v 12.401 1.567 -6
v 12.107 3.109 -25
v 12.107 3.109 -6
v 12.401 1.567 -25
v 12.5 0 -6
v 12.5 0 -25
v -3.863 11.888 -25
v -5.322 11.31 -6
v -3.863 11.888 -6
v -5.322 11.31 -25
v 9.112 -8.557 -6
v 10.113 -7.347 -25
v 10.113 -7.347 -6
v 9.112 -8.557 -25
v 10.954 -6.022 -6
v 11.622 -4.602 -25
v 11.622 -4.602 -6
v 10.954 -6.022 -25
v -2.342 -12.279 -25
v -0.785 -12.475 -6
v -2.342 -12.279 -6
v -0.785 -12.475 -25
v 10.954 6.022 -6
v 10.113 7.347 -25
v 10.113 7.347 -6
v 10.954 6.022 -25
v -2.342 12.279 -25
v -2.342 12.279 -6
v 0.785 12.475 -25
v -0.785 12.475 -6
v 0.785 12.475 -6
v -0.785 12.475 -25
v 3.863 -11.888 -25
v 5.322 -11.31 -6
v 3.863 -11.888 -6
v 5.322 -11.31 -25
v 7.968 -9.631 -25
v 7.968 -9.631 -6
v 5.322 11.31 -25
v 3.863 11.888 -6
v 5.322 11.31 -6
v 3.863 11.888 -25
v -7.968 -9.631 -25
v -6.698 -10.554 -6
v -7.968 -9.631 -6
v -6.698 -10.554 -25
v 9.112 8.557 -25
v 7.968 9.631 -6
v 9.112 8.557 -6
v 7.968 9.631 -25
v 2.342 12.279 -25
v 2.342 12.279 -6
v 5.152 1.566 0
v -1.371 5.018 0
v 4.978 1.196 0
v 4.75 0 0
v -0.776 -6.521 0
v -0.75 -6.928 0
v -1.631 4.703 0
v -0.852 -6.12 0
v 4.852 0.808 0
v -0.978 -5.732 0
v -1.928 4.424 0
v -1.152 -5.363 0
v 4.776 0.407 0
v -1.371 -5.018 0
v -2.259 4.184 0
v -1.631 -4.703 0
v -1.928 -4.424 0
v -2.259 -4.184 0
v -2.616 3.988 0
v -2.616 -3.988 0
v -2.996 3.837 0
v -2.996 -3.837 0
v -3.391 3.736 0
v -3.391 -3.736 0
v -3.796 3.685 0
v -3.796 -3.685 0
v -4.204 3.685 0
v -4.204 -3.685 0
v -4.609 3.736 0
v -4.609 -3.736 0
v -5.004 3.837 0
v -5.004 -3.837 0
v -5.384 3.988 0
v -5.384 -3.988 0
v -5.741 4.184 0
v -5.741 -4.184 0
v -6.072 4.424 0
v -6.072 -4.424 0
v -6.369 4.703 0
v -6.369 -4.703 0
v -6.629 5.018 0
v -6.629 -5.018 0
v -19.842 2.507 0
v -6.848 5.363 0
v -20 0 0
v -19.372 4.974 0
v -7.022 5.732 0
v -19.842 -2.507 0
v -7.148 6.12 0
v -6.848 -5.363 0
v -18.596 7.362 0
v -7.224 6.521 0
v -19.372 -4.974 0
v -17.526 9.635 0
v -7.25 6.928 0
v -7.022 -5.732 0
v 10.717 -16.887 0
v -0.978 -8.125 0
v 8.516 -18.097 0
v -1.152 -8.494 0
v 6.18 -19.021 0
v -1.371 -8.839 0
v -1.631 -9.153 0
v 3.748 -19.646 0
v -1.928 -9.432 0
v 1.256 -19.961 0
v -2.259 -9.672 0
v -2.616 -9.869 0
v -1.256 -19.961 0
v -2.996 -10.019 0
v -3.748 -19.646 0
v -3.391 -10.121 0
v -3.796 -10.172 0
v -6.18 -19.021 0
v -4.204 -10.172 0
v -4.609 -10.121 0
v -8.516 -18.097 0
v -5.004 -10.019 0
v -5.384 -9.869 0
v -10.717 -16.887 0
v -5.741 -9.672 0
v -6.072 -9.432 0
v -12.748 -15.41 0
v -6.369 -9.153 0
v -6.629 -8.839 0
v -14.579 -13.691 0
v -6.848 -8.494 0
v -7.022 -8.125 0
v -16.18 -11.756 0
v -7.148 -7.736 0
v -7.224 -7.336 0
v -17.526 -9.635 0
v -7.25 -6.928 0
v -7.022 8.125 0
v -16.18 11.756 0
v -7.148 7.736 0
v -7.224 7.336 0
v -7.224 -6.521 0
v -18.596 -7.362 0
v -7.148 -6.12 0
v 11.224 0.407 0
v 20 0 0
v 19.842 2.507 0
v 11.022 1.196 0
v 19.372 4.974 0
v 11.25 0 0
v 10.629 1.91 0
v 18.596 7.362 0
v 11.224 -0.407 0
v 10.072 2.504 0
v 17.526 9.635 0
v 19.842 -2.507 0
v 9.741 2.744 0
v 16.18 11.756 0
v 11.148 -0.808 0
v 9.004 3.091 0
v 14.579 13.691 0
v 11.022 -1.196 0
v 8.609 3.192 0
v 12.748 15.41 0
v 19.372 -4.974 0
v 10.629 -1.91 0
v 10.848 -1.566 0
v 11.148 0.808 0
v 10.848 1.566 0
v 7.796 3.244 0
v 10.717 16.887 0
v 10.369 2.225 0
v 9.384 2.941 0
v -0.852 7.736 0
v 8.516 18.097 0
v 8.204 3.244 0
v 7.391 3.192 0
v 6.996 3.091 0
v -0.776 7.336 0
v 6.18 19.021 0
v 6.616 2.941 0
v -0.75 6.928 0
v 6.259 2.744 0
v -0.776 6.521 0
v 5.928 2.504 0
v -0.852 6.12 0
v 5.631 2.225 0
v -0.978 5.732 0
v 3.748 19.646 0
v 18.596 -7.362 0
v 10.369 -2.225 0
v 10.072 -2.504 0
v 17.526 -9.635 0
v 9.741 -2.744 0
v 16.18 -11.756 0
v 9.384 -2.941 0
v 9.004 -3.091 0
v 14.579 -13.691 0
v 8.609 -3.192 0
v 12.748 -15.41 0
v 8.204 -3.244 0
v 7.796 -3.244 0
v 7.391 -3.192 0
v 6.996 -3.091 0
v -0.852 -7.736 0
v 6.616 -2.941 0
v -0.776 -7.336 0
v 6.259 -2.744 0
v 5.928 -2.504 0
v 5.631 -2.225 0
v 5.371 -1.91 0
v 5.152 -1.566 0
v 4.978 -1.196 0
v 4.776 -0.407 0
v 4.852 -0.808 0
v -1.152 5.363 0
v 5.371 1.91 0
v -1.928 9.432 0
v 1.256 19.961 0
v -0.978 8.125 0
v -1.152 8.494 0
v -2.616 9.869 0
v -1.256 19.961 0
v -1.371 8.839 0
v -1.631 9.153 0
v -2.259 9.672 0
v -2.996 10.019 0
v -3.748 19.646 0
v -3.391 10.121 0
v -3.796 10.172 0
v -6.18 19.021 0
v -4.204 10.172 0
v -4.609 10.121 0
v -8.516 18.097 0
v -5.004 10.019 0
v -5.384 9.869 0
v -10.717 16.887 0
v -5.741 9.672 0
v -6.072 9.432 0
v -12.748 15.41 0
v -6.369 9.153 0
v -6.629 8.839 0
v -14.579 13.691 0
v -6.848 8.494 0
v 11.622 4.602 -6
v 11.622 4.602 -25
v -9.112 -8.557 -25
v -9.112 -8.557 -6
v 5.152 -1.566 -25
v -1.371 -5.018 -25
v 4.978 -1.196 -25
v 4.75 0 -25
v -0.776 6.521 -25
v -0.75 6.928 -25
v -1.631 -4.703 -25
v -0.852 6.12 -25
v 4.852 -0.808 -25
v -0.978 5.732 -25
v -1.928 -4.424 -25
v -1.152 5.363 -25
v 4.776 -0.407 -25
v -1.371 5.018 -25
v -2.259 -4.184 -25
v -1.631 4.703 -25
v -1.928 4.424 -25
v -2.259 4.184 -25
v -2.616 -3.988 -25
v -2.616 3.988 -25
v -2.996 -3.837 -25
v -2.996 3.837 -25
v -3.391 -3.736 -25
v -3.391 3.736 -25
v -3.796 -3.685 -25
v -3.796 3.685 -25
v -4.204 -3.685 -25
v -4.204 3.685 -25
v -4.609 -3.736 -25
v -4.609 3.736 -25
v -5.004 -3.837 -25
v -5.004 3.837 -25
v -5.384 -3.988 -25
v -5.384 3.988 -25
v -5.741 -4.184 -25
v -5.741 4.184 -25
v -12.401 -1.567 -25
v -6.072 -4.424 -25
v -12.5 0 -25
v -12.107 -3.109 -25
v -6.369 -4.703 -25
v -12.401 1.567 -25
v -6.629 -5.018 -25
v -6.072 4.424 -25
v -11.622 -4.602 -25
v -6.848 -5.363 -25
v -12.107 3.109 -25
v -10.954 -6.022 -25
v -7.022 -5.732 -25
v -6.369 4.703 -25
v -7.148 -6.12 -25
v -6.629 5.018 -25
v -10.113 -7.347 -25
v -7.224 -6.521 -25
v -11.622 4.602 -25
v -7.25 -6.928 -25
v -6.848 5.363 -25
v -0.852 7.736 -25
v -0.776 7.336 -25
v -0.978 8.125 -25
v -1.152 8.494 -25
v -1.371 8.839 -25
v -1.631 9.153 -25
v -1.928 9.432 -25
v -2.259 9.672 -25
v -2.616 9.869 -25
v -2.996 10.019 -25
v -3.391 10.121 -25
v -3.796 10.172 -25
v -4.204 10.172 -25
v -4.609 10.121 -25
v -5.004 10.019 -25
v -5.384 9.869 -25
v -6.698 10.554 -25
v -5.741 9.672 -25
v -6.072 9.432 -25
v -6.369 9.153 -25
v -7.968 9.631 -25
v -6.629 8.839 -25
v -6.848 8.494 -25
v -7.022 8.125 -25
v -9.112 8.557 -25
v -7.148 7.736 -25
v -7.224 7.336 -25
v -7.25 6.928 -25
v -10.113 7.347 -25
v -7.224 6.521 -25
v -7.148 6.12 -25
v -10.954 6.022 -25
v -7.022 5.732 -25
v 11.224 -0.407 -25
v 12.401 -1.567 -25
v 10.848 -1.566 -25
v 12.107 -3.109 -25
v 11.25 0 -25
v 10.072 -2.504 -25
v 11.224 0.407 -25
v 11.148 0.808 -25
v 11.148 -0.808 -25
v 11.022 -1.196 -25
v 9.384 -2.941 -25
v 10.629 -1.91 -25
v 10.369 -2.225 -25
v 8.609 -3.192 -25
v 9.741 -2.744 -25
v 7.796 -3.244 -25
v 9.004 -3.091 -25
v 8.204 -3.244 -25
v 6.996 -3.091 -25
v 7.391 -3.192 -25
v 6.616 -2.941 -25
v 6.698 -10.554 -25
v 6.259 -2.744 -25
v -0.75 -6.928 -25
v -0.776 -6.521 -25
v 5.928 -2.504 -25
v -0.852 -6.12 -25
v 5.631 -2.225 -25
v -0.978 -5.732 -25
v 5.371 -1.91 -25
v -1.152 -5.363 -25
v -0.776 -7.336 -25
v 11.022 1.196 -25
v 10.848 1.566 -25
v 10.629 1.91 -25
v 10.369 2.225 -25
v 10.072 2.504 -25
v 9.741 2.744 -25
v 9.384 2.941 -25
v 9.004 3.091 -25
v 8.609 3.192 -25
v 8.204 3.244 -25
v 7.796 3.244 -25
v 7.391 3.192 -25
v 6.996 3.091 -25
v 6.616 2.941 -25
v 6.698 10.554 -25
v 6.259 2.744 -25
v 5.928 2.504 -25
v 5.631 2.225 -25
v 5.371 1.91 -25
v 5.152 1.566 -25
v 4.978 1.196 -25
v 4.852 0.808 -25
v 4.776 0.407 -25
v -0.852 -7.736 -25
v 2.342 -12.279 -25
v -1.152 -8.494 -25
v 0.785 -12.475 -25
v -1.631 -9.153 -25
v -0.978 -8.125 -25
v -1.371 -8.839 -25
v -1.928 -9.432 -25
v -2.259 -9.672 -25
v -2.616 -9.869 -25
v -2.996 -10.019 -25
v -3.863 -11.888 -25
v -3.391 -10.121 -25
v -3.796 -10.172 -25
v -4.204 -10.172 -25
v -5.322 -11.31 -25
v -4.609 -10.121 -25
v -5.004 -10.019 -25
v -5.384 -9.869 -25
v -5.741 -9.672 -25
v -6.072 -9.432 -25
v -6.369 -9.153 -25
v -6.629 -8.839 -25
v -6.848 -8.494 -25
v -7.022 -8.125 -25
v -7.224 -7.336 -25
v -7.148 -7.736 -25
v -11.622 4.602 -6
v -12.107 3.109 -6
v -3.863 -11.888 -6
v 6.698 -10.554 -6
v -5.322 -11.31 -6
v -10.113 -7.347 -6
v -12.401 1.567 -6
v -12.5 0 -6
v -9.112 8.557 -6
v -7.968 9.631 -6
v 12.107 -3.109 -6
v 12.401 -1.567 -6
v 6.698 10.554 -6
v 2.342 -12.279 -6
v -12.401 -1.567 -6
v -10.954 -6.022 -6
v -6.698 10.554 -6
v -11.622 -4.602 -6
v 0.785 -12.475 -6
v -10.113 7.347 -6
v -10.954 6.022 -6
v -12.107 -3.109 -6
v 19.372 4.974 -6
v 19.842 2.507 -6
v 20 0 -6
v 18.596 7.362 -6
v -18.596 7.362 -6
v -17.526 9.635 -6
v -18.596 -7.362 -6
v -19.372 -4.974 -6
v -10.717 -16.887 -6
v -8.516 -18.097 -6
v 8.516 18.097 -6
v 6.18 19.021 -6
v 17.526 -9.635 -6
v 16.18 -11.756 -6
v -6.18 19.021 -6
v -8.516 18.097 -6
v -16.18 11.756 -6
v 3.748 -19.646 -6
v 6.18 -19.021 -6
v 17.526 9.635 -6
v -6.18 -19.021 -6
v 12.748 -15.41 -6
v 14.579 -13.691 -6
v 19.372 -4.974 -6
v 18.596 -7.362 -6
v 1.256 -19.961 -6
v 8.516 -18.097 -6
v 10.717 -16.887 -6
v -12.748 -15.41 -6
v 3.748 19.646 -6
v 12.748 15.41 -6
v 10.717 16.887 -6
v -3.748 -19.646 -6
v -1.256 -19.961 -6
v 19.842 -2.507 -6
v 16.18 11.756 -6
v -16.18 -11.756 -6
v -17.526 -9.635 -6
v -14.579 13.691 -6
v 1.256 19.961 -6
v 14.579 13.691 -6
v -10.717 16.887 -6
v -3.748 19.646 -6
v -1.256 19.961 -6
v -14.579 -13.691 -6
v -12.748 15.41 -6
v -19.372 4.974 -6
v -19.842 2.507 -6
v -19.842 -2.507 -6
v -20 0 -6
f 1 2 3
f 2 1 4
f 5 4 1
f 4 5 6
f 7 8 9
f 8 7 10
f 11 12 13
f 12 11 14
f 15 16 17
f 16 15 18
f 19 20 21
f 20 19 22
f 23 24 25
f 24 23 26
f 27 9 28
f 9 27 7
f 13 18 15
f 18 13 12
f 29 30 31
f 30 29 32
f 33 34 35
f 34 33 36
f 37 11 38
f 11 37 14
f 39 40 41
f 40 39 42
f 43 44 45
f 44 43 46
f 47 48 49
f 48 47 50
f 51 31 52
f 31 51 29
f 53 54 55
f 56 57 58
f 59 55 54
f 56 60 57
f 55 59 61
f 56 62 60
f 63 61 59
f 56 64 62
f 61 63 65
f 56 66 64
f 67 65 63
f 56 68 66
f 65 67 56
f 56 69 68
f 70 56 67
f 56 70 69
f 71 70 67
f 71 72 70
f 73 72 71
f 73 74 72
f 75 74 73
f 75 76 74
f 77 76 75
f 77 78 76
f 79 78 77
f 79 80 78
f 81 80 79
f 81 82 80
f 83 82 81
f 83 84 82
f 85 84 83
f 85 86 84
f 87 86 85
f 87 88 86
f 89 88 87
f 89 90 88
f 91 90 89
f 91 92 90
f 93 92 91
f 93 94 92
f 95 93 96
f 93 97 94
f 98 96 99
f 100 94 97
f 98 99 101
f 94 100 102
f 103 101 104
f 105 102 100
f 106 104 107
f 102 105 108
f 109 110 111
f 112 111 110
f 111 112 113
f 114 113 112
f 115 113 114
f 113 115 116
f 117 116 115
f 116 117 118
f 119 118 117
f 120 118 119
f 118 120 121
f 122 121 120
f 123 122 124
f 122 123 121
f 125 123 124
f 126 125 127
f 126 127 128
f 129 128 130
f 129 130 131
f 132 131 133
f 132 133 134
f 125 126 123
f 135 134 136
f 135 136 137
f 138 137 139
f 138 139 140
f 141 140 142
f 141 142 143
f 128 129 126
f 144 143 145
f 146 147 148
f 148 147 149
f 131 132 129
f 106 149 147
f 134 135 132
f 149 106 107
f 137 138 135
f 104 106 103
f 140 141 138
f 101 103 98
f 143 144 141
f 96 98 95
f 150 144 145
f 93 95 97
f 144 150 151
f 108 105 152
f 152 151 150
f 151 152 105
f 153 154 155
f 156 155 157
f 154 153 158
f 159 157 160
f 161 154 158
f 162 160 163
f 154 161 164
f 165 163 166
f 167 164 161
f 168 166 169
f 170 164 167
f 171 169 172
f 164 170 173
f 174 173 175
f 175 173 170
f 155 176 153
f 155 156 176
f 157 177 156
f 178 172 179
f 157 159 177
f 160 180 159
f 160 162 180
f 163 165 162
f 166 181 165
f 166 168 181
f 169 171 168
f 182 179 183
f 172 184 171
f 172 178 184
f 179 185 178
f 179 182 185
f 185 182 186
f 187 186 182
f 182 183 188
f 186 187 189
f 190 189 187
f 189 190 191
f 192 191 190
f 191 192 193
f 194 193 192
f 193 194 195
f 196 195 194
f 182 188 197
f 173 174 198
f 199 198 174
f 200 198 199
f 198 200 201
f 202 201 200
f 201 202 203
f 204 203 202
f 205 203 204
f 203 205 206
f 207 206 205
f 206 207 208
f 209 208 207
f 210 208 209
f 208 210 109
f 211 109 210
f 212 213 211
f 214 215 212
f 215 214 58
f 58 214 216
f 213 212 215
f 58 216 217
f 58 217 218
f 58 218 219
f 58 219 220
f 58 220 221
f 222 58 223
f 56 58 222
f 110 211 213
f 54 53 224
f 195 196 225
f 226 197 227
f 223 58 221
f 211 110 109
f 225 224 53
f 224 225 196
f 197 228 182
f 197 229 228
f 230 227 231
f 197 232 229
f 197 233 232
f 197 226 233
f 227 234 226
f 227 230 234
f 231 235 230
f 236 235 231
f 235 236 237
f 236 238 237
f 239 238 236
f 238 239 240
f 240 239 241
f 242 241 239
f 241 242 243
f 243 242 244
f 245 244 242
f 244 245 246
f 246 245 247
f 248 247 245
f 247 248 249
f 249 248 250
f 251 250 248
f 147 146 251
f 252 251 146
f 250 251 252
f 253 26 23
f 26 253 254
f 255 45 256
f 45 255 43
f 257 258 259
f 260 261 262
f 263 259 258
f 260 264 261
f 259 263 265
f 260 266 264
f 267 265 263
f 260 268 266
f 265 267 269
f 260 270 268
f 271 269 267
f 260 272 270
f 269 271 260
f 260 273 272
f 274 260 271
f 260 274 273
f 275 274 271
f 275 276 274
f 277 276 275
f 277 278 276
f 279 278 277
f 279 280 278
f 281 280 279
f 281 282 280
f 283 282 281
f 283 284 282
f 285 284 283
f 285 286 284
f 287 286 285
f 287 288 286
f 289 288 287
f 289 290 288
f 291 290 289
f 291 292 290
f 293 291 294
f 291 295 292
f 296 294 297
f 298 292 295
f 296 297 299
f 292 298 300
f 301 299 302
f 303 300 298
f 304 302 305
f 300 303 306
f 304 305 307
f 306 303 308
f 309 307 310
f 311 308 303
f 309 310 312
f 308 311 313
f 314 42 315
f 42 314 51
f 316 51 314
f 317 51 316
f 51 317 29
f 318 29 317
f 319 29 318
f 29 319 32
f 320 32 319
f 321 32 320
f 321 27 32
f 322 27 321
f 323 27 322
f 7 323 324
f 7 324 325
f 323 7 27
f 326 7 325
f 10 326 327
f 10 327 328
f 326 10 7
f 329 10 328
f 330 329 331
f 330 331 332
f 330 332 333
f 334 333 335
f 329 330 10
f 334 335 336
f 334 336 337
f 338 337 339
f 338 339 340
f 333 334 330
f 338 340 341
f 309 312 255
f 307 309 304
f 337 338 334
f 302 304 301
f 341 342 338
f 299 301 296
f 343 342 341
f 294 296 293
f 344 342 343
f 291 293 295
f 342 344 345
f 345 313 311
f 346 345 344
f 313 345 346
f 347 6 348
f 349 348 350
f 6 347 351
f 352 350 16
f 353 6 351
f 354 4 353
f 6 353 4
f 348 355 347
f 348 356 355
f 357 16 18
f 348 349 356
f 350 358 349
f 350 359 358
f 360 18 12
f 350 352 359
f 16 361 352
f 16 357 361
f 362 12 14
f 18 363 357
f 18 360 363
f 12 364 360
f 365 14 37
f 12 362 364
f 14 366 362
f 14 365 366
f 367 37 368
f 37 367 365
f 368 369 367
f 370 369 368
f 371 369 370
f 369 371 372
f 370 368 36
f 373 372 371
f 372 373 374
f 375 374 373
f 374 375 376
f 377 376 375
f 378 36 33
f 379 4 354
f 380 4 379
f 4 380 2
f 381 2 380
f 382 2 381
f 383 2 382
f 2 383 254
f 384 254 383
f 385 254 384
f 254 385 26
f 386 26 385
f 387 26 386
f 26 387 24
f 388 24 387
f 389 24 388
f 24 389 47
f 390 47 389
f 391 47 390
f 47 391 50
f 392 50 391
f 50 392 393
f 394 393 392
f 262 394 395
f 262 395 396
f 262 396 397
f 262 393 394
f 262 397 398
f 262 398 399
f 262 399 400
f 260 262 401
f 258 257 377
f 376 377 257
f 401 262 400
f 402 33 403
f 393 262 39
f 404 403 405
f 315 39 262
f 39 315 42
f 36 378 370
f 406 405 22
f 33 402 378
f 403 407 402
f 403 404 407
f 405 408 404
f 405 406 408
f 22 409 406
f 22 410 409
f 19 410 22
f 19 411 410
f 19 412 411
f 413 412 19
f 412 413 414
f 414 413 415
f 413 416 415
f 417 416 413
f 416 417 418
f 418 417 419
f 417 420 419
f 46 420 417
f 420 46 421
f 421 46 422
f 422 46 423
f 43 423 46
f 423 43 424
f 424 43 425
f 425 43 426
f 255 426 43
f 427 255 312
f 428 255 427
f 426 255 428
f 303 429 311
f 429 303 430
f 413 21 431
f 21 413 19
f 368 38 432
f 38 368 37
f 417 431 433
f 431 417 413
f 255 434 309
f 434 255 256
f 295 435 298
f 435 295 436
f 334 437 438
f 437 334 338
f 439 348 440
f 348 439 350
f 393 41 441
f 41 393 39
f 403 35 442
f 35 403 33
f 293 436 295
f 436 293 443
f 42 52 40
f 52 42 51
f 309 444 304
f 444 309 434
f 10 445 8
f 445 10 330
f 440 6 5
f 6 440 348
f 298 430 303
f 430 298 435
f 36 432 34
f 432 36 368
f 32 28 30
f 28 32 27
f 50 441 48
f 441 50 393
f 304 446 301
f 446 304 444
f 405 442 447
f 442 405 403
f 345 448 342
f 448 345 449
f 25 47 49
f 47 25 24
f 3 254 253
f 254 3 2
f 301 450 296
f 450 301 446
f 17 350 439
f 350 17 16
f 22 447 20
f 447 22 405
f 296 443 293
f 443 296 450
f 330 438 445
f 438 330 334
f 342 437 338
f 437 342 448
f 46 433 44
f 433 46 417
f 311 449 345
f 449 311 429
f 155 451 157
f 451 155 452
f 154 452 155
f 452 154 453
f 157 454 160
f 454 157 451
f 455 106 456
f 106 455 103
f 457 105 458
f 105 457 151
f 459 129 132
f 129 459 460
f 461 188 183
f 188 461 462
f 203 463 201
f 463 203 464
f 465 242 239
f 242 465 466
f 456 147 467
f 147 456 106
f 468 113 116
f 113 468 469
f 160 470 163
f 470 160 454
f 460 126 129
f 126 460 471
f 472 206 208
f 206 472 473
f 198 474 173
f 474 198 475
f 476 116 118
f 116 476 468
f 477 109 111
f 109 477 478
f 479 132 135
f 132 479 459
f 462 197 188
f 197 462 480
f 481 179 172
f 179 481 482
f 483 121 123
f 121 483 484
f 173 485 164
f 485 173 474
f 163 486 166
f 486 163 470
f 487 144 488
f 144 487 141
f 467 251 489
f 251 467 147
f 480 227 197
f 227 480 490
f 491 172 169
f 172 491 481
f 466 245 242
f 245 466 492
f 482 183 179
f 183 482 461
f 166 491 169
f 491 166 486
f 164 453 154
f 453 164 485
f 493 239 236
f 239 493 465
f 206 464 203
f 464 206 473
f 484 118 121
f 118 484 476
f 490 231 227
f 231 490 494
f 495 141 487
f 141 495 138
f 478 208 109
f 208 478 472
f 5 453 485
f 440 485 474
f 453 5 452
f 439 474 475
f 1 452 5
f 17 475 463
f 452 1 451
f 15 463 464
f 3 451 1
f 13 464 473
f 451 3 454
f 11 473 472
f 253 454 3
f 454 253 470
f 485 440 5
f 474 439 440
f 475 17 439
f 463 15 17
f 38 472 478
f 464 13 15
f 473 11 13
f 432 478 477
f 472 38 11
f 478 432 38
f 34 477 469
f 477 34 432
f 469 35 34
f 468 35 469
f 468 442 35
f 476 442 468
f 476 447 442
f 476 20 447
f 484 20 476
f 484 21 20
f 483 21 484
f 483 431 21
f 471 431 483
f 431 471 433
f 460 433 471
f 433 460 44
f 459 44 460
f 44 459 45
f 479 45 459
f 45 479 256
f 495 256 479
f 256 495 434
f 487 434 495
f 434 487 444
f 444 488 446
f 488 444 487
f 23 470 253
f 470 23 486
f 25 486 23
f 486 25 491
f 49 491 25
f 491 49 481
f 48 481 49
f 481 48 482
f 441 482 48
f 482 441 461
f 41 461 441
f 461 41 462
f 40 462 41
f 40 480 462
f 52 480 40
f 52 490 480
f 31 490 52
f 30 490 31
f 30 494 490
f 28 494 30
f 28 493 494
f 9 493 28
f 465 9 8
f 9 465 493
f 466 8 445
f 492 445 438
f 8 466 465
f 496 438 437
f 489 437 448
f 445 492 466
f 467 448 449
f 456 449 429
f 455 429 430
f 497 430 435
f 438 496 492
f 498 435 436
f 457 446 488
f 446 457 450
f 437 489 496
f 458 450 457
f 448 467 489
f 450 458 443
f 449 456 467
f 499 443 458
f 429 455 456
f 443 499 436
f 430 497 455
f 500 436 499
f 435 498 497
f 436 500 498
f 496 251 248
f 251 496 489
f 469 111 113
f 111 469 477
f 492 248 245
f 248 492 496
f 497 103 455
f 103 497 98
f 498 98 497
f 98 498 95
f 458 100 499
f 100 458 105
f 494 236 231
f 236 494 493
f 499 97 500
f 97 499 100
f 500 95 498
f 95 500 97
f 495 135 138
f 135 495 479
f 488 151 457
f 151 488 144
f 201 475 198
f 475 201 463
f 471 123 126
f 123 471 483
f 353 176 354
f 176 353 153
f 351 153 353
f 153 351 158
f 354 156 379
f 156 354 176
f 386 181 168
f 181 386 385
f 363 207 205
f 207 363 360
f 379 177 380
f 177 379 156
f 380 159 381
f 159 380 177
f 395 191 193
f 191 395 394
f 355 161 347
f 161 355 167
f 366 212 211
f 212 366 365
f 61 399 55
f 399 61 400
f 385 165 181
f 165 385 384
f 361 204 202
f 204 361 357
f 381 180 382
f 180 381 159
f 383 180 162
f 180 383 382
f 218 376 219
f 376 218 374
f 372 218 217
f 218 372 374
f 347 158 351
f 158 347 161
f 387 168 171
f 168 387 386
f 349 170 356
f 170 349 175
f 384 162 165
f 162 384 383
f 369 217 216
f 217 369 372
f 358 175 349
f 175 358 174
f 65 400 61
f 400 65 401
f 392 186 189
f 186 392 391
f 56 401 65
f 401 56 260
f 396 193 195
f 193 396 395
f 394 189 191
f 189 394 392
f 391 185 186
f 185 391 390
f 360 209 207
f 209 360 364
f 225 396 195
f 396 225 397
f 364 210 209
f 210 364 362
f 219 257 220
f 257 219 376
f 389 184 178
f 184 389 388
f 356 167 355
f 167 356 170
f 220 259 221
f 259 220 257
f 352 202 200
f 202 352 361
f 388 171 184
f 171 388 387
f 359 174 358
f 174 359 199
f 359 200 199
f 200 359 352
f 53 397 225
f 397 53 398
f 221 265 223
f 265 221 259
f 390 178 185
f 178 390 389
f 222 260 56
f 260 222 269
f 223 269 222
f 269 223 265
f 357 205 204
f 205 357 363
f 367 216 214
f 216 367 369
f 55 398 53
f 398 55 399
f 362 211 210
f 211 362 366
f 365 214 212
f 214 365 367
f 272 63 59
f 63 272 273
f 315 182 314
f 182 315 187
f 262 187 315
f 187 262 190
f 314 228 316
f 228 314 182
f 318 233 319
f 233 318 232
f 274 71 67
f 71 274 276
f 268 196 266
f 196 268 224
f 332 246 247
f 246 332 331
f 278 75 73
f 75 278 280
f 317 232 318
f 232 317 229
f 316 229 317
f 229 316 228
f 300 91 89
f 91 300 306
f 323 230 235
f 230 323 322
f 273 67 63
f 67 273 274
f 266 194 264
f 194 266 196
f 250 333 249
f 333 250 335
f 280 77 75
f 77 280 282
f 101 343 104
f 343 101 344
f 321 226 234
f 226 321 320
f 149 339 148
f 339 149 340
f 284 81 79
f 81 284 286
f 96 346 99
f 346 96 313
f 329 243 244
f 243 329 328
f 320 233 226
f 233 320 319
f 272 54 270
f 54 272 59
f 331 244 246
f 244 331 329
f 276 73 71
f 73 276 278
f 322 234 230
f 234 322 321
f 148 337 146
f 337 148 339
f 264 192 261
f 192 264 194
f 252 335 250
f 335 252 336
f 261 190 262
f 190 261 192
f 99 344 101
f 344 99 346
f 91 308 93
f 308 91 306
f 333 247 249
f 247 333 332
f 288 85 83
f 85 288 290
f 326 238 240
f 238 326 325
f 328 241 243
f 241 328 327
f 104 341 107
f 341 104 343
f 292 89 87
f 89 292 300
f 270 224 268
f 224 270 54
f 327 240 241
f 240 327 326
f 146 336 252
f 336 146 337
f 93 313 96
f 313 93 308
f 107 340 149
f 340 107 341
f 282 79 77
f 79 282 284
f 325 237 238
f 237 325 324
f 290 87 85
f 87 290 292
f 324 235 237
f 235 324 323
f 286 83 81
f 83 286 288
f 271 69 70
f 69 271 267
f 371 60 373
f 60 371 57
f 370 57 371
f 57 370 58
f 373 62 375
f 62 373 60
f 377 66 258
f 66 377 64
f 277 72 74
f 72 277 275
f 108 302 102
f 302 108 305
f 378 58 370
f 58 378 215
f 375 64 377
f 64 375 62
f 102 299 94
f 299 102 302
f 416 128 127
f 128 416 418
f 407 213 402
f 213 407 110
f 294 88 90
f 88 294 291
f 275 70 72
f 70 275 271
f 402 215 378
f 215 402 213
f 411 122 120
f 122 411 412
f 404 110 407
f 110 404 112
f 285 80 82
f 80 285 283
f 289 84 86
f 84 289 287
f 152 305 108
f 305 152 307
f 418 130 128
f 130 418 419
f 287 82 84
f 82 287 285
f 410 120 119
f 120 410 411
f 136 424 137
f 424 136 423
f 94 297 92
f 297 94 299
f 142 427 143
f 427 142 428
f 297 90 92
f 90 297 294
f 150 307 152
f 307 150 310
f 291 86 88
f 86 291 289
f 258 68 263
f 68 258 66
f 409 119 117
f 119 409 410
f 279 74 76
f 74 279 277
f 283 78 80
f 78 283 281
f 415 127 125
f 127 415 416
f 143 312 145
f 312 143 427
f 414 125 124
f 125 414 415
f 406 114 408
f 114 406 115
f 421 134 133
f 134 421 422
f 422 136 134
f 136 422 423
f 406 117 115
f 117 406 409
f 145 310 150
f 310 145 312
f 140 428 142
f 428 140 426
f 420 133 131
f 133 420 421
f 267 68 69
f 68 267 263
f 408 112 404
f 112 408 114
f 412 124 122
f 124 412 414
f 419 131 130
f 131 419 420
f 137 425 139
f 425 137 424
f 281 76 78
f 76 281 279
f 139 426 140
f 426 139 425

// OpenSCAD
$fn = 50;


difference() {
	union() {
		translate(v = [0, 0, -25.0000000000]) {
			cylinder(h = 25, r = 12.5000000000);
		}
		translate(v = [0, 0, -6.0000000000]) {
			cylinder(h = 6, r = 20.0000000000);
		}
	}
	union() {
		#translate(v = [8.0000000000, 0.0000000000, -25]) {
			cylinder(h = 25, r = 3.2500000000);
		}
		#translate(v = [-4.0000000000, 6.9282032303, -25]) {
			cylinder(h = 25, r = 3.2500000000);
		}
		#translate(v = [-4.0000000000, -6.9282032303, -25]) {
			cylinder(h = 25, r = 3.2500000000);
		}
	}
}
